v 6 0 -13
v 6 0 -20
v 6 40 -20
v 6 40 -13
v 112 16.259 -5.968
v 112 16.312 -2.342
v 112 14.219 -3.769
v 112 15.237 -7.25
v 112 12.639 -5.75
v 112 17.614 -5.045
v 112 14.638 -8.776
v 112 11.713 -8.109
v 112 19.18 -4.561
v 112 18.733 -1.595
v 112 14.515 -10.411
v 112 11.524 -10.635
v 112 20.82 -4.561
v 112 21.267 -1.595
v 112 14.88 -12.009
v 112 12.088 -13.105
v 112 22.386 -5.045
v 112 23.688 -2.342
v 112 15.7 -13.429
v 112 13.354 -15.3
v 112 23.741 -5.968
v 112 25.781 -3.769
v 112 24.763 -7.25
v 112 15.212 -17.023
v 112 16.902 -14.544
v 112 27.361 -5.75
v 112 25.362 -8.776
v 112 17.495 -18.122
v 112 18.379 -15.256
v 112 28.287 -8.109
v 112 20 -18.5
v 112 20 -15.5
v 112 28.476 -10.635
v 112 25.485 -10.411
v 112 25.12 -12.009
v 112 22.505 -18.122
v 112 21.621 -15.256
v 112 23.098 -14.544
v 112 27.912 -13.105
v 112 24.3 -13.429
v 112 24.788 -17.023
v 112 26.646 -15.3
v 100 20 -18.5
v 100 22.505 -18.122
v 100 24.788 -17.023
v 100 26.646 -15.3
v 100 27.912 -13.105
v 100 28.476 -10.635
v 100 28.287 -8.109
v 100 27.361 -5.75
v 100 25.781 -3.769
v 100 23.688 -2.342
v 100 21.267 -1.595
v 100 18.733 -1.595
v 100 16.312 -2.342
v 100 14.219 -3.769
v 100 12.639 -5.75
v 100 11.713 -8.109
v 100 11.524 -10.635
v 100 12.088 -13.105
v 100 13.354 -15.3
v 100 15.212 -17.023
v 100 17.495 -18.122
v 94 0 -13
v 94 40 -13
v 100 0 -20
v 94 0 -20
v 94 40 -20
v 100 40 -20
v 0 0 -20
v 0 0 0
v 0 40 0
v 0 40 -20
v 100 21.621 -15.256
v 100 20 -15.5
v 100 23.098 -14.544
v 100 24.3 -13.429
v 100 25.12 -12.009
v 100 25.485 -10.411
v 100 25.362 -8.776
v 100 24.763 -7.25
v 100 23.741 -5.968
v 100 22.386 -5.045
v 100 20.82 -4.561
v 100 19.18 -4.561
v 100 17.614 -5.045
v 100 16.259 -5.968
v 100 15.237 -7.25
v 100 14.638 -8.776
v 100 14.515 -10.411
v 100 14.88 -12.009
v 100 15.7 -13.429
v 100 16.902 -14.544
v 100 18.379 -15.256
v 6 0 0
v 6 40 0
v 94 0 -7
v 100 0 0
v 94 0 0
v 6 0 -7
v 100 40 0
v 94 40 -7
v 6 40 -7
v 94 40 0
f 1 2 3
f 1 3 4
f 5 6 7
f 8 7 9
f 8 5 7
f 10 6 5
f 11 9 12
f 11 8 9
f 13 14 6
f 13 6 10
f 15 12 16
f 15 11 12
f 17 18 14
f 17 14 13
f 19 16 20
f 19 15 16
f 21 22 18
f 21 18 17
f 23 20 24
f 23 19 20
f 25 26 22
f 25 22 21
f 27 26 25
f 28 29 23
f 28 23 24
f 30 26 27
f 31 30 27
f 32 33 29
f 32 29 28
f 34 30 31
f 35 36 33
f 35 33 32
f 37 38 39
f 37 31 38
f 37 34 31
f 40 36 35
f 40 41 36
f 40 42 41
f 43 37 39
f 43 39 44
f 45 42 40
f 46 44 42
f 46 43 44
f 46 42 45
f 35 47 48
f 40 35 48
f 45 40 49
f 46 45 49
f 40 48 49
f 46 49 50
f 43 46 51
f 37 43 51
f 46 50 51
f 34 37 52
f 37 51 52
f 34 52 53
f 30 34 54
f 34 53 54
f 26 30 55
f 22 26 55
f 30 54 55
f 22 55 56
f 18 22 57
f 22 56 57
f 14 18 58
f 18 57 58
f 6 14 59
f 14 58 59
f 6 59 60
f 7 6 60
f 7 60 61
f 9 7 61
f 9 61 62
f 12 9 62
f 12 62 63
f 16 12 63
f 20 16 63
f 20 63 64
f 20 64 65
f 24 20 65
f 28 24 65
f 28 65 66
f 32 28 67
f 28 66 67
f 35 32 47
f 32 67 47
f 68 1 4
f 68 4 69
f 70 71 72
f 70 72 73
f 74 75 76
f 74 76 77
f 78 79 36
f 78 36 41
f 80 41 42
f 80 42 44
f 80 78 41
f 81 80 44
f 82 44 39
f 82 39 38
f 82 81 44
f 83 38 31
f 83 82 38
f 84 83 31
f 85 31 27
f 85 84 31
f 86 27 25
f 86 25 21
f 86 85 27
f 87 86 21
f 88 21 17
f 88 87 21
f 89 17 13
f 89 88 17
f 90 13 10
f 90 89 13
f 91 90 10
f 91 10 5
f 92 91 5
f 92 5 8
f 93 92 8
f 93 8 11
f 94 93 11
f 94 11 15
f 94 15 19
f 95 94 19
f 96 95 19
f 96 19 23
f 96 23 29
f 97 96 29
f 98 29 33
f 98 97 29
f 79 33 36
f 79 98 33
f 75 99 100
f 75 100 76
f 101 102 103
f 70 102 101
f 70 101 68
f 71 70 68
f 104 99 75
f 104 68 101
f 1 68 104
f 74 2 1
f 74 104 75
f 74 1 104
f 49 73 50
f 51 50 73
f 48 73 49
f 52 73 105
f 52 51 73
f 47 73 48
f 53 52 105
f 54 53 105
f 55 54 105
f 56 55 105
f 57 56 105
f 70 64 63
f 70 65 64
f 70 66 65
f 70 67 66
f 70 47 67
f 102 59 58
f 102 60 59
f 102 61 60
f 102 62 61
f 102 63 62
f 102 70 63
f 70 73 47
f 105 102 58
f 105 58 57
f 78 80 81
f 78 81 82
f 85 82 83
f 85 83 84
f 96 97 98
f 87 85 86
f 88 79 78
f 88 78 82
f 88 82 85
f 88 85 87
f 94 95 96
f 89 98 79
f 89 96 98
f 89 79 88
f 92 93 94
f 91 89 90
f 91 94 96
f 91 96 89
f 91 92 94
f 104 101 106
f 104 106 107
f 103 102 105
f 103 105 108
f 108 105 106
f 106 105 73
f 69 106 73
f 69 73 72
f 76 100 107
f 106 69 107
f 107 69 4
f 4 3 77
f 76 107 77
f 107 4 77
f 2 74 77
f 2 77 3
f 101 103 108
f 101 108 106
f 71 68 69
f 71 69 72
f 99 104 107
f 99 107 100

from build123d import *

# Parameters (mm, degrees)
BOSS_EXTRUDE2_DEPTH = 40
SKETCH2_R           = 8.5
SKETCH2_R_2         = 5.5
BOSS_EXTRUDE3_DEPTH = 12


with BuildPart() as part:
    # Sketch1 → Boss-Extrude2 (new body)
    with BuildSketch(Plane(origin=(0, 0, 0), x_dir=(1, 0, 0), z_dir=(0, 1, 0))):
        Polygon((0, 0), (0, 20), (6, 20), (6, 13), (94, 13), (94, 20), (100, 20), (100, 0), (94, 0), (94, 7), (6, 7), (6, 0), align=None)
    extrude(amount=BOSS_EXTRUDE2_DEPTH)

    # Sketch2 → Boss-Extrude3 (add)
    with BuildSketch(Plane(origin=(100, 0, 0), x_dir=(0, 0, -1), z_dir=(1, 0, 0))):
        with Locations((10, 20)):
            Circle(SKETCH2_R)
        with Locations((10, 20)):
            Circle(SKETCH2_R_2, mode=Mode.SUBTRACT)
    extrude(amount=BOSS_EXTRUDE3_DEPTH)


solid = part.part
